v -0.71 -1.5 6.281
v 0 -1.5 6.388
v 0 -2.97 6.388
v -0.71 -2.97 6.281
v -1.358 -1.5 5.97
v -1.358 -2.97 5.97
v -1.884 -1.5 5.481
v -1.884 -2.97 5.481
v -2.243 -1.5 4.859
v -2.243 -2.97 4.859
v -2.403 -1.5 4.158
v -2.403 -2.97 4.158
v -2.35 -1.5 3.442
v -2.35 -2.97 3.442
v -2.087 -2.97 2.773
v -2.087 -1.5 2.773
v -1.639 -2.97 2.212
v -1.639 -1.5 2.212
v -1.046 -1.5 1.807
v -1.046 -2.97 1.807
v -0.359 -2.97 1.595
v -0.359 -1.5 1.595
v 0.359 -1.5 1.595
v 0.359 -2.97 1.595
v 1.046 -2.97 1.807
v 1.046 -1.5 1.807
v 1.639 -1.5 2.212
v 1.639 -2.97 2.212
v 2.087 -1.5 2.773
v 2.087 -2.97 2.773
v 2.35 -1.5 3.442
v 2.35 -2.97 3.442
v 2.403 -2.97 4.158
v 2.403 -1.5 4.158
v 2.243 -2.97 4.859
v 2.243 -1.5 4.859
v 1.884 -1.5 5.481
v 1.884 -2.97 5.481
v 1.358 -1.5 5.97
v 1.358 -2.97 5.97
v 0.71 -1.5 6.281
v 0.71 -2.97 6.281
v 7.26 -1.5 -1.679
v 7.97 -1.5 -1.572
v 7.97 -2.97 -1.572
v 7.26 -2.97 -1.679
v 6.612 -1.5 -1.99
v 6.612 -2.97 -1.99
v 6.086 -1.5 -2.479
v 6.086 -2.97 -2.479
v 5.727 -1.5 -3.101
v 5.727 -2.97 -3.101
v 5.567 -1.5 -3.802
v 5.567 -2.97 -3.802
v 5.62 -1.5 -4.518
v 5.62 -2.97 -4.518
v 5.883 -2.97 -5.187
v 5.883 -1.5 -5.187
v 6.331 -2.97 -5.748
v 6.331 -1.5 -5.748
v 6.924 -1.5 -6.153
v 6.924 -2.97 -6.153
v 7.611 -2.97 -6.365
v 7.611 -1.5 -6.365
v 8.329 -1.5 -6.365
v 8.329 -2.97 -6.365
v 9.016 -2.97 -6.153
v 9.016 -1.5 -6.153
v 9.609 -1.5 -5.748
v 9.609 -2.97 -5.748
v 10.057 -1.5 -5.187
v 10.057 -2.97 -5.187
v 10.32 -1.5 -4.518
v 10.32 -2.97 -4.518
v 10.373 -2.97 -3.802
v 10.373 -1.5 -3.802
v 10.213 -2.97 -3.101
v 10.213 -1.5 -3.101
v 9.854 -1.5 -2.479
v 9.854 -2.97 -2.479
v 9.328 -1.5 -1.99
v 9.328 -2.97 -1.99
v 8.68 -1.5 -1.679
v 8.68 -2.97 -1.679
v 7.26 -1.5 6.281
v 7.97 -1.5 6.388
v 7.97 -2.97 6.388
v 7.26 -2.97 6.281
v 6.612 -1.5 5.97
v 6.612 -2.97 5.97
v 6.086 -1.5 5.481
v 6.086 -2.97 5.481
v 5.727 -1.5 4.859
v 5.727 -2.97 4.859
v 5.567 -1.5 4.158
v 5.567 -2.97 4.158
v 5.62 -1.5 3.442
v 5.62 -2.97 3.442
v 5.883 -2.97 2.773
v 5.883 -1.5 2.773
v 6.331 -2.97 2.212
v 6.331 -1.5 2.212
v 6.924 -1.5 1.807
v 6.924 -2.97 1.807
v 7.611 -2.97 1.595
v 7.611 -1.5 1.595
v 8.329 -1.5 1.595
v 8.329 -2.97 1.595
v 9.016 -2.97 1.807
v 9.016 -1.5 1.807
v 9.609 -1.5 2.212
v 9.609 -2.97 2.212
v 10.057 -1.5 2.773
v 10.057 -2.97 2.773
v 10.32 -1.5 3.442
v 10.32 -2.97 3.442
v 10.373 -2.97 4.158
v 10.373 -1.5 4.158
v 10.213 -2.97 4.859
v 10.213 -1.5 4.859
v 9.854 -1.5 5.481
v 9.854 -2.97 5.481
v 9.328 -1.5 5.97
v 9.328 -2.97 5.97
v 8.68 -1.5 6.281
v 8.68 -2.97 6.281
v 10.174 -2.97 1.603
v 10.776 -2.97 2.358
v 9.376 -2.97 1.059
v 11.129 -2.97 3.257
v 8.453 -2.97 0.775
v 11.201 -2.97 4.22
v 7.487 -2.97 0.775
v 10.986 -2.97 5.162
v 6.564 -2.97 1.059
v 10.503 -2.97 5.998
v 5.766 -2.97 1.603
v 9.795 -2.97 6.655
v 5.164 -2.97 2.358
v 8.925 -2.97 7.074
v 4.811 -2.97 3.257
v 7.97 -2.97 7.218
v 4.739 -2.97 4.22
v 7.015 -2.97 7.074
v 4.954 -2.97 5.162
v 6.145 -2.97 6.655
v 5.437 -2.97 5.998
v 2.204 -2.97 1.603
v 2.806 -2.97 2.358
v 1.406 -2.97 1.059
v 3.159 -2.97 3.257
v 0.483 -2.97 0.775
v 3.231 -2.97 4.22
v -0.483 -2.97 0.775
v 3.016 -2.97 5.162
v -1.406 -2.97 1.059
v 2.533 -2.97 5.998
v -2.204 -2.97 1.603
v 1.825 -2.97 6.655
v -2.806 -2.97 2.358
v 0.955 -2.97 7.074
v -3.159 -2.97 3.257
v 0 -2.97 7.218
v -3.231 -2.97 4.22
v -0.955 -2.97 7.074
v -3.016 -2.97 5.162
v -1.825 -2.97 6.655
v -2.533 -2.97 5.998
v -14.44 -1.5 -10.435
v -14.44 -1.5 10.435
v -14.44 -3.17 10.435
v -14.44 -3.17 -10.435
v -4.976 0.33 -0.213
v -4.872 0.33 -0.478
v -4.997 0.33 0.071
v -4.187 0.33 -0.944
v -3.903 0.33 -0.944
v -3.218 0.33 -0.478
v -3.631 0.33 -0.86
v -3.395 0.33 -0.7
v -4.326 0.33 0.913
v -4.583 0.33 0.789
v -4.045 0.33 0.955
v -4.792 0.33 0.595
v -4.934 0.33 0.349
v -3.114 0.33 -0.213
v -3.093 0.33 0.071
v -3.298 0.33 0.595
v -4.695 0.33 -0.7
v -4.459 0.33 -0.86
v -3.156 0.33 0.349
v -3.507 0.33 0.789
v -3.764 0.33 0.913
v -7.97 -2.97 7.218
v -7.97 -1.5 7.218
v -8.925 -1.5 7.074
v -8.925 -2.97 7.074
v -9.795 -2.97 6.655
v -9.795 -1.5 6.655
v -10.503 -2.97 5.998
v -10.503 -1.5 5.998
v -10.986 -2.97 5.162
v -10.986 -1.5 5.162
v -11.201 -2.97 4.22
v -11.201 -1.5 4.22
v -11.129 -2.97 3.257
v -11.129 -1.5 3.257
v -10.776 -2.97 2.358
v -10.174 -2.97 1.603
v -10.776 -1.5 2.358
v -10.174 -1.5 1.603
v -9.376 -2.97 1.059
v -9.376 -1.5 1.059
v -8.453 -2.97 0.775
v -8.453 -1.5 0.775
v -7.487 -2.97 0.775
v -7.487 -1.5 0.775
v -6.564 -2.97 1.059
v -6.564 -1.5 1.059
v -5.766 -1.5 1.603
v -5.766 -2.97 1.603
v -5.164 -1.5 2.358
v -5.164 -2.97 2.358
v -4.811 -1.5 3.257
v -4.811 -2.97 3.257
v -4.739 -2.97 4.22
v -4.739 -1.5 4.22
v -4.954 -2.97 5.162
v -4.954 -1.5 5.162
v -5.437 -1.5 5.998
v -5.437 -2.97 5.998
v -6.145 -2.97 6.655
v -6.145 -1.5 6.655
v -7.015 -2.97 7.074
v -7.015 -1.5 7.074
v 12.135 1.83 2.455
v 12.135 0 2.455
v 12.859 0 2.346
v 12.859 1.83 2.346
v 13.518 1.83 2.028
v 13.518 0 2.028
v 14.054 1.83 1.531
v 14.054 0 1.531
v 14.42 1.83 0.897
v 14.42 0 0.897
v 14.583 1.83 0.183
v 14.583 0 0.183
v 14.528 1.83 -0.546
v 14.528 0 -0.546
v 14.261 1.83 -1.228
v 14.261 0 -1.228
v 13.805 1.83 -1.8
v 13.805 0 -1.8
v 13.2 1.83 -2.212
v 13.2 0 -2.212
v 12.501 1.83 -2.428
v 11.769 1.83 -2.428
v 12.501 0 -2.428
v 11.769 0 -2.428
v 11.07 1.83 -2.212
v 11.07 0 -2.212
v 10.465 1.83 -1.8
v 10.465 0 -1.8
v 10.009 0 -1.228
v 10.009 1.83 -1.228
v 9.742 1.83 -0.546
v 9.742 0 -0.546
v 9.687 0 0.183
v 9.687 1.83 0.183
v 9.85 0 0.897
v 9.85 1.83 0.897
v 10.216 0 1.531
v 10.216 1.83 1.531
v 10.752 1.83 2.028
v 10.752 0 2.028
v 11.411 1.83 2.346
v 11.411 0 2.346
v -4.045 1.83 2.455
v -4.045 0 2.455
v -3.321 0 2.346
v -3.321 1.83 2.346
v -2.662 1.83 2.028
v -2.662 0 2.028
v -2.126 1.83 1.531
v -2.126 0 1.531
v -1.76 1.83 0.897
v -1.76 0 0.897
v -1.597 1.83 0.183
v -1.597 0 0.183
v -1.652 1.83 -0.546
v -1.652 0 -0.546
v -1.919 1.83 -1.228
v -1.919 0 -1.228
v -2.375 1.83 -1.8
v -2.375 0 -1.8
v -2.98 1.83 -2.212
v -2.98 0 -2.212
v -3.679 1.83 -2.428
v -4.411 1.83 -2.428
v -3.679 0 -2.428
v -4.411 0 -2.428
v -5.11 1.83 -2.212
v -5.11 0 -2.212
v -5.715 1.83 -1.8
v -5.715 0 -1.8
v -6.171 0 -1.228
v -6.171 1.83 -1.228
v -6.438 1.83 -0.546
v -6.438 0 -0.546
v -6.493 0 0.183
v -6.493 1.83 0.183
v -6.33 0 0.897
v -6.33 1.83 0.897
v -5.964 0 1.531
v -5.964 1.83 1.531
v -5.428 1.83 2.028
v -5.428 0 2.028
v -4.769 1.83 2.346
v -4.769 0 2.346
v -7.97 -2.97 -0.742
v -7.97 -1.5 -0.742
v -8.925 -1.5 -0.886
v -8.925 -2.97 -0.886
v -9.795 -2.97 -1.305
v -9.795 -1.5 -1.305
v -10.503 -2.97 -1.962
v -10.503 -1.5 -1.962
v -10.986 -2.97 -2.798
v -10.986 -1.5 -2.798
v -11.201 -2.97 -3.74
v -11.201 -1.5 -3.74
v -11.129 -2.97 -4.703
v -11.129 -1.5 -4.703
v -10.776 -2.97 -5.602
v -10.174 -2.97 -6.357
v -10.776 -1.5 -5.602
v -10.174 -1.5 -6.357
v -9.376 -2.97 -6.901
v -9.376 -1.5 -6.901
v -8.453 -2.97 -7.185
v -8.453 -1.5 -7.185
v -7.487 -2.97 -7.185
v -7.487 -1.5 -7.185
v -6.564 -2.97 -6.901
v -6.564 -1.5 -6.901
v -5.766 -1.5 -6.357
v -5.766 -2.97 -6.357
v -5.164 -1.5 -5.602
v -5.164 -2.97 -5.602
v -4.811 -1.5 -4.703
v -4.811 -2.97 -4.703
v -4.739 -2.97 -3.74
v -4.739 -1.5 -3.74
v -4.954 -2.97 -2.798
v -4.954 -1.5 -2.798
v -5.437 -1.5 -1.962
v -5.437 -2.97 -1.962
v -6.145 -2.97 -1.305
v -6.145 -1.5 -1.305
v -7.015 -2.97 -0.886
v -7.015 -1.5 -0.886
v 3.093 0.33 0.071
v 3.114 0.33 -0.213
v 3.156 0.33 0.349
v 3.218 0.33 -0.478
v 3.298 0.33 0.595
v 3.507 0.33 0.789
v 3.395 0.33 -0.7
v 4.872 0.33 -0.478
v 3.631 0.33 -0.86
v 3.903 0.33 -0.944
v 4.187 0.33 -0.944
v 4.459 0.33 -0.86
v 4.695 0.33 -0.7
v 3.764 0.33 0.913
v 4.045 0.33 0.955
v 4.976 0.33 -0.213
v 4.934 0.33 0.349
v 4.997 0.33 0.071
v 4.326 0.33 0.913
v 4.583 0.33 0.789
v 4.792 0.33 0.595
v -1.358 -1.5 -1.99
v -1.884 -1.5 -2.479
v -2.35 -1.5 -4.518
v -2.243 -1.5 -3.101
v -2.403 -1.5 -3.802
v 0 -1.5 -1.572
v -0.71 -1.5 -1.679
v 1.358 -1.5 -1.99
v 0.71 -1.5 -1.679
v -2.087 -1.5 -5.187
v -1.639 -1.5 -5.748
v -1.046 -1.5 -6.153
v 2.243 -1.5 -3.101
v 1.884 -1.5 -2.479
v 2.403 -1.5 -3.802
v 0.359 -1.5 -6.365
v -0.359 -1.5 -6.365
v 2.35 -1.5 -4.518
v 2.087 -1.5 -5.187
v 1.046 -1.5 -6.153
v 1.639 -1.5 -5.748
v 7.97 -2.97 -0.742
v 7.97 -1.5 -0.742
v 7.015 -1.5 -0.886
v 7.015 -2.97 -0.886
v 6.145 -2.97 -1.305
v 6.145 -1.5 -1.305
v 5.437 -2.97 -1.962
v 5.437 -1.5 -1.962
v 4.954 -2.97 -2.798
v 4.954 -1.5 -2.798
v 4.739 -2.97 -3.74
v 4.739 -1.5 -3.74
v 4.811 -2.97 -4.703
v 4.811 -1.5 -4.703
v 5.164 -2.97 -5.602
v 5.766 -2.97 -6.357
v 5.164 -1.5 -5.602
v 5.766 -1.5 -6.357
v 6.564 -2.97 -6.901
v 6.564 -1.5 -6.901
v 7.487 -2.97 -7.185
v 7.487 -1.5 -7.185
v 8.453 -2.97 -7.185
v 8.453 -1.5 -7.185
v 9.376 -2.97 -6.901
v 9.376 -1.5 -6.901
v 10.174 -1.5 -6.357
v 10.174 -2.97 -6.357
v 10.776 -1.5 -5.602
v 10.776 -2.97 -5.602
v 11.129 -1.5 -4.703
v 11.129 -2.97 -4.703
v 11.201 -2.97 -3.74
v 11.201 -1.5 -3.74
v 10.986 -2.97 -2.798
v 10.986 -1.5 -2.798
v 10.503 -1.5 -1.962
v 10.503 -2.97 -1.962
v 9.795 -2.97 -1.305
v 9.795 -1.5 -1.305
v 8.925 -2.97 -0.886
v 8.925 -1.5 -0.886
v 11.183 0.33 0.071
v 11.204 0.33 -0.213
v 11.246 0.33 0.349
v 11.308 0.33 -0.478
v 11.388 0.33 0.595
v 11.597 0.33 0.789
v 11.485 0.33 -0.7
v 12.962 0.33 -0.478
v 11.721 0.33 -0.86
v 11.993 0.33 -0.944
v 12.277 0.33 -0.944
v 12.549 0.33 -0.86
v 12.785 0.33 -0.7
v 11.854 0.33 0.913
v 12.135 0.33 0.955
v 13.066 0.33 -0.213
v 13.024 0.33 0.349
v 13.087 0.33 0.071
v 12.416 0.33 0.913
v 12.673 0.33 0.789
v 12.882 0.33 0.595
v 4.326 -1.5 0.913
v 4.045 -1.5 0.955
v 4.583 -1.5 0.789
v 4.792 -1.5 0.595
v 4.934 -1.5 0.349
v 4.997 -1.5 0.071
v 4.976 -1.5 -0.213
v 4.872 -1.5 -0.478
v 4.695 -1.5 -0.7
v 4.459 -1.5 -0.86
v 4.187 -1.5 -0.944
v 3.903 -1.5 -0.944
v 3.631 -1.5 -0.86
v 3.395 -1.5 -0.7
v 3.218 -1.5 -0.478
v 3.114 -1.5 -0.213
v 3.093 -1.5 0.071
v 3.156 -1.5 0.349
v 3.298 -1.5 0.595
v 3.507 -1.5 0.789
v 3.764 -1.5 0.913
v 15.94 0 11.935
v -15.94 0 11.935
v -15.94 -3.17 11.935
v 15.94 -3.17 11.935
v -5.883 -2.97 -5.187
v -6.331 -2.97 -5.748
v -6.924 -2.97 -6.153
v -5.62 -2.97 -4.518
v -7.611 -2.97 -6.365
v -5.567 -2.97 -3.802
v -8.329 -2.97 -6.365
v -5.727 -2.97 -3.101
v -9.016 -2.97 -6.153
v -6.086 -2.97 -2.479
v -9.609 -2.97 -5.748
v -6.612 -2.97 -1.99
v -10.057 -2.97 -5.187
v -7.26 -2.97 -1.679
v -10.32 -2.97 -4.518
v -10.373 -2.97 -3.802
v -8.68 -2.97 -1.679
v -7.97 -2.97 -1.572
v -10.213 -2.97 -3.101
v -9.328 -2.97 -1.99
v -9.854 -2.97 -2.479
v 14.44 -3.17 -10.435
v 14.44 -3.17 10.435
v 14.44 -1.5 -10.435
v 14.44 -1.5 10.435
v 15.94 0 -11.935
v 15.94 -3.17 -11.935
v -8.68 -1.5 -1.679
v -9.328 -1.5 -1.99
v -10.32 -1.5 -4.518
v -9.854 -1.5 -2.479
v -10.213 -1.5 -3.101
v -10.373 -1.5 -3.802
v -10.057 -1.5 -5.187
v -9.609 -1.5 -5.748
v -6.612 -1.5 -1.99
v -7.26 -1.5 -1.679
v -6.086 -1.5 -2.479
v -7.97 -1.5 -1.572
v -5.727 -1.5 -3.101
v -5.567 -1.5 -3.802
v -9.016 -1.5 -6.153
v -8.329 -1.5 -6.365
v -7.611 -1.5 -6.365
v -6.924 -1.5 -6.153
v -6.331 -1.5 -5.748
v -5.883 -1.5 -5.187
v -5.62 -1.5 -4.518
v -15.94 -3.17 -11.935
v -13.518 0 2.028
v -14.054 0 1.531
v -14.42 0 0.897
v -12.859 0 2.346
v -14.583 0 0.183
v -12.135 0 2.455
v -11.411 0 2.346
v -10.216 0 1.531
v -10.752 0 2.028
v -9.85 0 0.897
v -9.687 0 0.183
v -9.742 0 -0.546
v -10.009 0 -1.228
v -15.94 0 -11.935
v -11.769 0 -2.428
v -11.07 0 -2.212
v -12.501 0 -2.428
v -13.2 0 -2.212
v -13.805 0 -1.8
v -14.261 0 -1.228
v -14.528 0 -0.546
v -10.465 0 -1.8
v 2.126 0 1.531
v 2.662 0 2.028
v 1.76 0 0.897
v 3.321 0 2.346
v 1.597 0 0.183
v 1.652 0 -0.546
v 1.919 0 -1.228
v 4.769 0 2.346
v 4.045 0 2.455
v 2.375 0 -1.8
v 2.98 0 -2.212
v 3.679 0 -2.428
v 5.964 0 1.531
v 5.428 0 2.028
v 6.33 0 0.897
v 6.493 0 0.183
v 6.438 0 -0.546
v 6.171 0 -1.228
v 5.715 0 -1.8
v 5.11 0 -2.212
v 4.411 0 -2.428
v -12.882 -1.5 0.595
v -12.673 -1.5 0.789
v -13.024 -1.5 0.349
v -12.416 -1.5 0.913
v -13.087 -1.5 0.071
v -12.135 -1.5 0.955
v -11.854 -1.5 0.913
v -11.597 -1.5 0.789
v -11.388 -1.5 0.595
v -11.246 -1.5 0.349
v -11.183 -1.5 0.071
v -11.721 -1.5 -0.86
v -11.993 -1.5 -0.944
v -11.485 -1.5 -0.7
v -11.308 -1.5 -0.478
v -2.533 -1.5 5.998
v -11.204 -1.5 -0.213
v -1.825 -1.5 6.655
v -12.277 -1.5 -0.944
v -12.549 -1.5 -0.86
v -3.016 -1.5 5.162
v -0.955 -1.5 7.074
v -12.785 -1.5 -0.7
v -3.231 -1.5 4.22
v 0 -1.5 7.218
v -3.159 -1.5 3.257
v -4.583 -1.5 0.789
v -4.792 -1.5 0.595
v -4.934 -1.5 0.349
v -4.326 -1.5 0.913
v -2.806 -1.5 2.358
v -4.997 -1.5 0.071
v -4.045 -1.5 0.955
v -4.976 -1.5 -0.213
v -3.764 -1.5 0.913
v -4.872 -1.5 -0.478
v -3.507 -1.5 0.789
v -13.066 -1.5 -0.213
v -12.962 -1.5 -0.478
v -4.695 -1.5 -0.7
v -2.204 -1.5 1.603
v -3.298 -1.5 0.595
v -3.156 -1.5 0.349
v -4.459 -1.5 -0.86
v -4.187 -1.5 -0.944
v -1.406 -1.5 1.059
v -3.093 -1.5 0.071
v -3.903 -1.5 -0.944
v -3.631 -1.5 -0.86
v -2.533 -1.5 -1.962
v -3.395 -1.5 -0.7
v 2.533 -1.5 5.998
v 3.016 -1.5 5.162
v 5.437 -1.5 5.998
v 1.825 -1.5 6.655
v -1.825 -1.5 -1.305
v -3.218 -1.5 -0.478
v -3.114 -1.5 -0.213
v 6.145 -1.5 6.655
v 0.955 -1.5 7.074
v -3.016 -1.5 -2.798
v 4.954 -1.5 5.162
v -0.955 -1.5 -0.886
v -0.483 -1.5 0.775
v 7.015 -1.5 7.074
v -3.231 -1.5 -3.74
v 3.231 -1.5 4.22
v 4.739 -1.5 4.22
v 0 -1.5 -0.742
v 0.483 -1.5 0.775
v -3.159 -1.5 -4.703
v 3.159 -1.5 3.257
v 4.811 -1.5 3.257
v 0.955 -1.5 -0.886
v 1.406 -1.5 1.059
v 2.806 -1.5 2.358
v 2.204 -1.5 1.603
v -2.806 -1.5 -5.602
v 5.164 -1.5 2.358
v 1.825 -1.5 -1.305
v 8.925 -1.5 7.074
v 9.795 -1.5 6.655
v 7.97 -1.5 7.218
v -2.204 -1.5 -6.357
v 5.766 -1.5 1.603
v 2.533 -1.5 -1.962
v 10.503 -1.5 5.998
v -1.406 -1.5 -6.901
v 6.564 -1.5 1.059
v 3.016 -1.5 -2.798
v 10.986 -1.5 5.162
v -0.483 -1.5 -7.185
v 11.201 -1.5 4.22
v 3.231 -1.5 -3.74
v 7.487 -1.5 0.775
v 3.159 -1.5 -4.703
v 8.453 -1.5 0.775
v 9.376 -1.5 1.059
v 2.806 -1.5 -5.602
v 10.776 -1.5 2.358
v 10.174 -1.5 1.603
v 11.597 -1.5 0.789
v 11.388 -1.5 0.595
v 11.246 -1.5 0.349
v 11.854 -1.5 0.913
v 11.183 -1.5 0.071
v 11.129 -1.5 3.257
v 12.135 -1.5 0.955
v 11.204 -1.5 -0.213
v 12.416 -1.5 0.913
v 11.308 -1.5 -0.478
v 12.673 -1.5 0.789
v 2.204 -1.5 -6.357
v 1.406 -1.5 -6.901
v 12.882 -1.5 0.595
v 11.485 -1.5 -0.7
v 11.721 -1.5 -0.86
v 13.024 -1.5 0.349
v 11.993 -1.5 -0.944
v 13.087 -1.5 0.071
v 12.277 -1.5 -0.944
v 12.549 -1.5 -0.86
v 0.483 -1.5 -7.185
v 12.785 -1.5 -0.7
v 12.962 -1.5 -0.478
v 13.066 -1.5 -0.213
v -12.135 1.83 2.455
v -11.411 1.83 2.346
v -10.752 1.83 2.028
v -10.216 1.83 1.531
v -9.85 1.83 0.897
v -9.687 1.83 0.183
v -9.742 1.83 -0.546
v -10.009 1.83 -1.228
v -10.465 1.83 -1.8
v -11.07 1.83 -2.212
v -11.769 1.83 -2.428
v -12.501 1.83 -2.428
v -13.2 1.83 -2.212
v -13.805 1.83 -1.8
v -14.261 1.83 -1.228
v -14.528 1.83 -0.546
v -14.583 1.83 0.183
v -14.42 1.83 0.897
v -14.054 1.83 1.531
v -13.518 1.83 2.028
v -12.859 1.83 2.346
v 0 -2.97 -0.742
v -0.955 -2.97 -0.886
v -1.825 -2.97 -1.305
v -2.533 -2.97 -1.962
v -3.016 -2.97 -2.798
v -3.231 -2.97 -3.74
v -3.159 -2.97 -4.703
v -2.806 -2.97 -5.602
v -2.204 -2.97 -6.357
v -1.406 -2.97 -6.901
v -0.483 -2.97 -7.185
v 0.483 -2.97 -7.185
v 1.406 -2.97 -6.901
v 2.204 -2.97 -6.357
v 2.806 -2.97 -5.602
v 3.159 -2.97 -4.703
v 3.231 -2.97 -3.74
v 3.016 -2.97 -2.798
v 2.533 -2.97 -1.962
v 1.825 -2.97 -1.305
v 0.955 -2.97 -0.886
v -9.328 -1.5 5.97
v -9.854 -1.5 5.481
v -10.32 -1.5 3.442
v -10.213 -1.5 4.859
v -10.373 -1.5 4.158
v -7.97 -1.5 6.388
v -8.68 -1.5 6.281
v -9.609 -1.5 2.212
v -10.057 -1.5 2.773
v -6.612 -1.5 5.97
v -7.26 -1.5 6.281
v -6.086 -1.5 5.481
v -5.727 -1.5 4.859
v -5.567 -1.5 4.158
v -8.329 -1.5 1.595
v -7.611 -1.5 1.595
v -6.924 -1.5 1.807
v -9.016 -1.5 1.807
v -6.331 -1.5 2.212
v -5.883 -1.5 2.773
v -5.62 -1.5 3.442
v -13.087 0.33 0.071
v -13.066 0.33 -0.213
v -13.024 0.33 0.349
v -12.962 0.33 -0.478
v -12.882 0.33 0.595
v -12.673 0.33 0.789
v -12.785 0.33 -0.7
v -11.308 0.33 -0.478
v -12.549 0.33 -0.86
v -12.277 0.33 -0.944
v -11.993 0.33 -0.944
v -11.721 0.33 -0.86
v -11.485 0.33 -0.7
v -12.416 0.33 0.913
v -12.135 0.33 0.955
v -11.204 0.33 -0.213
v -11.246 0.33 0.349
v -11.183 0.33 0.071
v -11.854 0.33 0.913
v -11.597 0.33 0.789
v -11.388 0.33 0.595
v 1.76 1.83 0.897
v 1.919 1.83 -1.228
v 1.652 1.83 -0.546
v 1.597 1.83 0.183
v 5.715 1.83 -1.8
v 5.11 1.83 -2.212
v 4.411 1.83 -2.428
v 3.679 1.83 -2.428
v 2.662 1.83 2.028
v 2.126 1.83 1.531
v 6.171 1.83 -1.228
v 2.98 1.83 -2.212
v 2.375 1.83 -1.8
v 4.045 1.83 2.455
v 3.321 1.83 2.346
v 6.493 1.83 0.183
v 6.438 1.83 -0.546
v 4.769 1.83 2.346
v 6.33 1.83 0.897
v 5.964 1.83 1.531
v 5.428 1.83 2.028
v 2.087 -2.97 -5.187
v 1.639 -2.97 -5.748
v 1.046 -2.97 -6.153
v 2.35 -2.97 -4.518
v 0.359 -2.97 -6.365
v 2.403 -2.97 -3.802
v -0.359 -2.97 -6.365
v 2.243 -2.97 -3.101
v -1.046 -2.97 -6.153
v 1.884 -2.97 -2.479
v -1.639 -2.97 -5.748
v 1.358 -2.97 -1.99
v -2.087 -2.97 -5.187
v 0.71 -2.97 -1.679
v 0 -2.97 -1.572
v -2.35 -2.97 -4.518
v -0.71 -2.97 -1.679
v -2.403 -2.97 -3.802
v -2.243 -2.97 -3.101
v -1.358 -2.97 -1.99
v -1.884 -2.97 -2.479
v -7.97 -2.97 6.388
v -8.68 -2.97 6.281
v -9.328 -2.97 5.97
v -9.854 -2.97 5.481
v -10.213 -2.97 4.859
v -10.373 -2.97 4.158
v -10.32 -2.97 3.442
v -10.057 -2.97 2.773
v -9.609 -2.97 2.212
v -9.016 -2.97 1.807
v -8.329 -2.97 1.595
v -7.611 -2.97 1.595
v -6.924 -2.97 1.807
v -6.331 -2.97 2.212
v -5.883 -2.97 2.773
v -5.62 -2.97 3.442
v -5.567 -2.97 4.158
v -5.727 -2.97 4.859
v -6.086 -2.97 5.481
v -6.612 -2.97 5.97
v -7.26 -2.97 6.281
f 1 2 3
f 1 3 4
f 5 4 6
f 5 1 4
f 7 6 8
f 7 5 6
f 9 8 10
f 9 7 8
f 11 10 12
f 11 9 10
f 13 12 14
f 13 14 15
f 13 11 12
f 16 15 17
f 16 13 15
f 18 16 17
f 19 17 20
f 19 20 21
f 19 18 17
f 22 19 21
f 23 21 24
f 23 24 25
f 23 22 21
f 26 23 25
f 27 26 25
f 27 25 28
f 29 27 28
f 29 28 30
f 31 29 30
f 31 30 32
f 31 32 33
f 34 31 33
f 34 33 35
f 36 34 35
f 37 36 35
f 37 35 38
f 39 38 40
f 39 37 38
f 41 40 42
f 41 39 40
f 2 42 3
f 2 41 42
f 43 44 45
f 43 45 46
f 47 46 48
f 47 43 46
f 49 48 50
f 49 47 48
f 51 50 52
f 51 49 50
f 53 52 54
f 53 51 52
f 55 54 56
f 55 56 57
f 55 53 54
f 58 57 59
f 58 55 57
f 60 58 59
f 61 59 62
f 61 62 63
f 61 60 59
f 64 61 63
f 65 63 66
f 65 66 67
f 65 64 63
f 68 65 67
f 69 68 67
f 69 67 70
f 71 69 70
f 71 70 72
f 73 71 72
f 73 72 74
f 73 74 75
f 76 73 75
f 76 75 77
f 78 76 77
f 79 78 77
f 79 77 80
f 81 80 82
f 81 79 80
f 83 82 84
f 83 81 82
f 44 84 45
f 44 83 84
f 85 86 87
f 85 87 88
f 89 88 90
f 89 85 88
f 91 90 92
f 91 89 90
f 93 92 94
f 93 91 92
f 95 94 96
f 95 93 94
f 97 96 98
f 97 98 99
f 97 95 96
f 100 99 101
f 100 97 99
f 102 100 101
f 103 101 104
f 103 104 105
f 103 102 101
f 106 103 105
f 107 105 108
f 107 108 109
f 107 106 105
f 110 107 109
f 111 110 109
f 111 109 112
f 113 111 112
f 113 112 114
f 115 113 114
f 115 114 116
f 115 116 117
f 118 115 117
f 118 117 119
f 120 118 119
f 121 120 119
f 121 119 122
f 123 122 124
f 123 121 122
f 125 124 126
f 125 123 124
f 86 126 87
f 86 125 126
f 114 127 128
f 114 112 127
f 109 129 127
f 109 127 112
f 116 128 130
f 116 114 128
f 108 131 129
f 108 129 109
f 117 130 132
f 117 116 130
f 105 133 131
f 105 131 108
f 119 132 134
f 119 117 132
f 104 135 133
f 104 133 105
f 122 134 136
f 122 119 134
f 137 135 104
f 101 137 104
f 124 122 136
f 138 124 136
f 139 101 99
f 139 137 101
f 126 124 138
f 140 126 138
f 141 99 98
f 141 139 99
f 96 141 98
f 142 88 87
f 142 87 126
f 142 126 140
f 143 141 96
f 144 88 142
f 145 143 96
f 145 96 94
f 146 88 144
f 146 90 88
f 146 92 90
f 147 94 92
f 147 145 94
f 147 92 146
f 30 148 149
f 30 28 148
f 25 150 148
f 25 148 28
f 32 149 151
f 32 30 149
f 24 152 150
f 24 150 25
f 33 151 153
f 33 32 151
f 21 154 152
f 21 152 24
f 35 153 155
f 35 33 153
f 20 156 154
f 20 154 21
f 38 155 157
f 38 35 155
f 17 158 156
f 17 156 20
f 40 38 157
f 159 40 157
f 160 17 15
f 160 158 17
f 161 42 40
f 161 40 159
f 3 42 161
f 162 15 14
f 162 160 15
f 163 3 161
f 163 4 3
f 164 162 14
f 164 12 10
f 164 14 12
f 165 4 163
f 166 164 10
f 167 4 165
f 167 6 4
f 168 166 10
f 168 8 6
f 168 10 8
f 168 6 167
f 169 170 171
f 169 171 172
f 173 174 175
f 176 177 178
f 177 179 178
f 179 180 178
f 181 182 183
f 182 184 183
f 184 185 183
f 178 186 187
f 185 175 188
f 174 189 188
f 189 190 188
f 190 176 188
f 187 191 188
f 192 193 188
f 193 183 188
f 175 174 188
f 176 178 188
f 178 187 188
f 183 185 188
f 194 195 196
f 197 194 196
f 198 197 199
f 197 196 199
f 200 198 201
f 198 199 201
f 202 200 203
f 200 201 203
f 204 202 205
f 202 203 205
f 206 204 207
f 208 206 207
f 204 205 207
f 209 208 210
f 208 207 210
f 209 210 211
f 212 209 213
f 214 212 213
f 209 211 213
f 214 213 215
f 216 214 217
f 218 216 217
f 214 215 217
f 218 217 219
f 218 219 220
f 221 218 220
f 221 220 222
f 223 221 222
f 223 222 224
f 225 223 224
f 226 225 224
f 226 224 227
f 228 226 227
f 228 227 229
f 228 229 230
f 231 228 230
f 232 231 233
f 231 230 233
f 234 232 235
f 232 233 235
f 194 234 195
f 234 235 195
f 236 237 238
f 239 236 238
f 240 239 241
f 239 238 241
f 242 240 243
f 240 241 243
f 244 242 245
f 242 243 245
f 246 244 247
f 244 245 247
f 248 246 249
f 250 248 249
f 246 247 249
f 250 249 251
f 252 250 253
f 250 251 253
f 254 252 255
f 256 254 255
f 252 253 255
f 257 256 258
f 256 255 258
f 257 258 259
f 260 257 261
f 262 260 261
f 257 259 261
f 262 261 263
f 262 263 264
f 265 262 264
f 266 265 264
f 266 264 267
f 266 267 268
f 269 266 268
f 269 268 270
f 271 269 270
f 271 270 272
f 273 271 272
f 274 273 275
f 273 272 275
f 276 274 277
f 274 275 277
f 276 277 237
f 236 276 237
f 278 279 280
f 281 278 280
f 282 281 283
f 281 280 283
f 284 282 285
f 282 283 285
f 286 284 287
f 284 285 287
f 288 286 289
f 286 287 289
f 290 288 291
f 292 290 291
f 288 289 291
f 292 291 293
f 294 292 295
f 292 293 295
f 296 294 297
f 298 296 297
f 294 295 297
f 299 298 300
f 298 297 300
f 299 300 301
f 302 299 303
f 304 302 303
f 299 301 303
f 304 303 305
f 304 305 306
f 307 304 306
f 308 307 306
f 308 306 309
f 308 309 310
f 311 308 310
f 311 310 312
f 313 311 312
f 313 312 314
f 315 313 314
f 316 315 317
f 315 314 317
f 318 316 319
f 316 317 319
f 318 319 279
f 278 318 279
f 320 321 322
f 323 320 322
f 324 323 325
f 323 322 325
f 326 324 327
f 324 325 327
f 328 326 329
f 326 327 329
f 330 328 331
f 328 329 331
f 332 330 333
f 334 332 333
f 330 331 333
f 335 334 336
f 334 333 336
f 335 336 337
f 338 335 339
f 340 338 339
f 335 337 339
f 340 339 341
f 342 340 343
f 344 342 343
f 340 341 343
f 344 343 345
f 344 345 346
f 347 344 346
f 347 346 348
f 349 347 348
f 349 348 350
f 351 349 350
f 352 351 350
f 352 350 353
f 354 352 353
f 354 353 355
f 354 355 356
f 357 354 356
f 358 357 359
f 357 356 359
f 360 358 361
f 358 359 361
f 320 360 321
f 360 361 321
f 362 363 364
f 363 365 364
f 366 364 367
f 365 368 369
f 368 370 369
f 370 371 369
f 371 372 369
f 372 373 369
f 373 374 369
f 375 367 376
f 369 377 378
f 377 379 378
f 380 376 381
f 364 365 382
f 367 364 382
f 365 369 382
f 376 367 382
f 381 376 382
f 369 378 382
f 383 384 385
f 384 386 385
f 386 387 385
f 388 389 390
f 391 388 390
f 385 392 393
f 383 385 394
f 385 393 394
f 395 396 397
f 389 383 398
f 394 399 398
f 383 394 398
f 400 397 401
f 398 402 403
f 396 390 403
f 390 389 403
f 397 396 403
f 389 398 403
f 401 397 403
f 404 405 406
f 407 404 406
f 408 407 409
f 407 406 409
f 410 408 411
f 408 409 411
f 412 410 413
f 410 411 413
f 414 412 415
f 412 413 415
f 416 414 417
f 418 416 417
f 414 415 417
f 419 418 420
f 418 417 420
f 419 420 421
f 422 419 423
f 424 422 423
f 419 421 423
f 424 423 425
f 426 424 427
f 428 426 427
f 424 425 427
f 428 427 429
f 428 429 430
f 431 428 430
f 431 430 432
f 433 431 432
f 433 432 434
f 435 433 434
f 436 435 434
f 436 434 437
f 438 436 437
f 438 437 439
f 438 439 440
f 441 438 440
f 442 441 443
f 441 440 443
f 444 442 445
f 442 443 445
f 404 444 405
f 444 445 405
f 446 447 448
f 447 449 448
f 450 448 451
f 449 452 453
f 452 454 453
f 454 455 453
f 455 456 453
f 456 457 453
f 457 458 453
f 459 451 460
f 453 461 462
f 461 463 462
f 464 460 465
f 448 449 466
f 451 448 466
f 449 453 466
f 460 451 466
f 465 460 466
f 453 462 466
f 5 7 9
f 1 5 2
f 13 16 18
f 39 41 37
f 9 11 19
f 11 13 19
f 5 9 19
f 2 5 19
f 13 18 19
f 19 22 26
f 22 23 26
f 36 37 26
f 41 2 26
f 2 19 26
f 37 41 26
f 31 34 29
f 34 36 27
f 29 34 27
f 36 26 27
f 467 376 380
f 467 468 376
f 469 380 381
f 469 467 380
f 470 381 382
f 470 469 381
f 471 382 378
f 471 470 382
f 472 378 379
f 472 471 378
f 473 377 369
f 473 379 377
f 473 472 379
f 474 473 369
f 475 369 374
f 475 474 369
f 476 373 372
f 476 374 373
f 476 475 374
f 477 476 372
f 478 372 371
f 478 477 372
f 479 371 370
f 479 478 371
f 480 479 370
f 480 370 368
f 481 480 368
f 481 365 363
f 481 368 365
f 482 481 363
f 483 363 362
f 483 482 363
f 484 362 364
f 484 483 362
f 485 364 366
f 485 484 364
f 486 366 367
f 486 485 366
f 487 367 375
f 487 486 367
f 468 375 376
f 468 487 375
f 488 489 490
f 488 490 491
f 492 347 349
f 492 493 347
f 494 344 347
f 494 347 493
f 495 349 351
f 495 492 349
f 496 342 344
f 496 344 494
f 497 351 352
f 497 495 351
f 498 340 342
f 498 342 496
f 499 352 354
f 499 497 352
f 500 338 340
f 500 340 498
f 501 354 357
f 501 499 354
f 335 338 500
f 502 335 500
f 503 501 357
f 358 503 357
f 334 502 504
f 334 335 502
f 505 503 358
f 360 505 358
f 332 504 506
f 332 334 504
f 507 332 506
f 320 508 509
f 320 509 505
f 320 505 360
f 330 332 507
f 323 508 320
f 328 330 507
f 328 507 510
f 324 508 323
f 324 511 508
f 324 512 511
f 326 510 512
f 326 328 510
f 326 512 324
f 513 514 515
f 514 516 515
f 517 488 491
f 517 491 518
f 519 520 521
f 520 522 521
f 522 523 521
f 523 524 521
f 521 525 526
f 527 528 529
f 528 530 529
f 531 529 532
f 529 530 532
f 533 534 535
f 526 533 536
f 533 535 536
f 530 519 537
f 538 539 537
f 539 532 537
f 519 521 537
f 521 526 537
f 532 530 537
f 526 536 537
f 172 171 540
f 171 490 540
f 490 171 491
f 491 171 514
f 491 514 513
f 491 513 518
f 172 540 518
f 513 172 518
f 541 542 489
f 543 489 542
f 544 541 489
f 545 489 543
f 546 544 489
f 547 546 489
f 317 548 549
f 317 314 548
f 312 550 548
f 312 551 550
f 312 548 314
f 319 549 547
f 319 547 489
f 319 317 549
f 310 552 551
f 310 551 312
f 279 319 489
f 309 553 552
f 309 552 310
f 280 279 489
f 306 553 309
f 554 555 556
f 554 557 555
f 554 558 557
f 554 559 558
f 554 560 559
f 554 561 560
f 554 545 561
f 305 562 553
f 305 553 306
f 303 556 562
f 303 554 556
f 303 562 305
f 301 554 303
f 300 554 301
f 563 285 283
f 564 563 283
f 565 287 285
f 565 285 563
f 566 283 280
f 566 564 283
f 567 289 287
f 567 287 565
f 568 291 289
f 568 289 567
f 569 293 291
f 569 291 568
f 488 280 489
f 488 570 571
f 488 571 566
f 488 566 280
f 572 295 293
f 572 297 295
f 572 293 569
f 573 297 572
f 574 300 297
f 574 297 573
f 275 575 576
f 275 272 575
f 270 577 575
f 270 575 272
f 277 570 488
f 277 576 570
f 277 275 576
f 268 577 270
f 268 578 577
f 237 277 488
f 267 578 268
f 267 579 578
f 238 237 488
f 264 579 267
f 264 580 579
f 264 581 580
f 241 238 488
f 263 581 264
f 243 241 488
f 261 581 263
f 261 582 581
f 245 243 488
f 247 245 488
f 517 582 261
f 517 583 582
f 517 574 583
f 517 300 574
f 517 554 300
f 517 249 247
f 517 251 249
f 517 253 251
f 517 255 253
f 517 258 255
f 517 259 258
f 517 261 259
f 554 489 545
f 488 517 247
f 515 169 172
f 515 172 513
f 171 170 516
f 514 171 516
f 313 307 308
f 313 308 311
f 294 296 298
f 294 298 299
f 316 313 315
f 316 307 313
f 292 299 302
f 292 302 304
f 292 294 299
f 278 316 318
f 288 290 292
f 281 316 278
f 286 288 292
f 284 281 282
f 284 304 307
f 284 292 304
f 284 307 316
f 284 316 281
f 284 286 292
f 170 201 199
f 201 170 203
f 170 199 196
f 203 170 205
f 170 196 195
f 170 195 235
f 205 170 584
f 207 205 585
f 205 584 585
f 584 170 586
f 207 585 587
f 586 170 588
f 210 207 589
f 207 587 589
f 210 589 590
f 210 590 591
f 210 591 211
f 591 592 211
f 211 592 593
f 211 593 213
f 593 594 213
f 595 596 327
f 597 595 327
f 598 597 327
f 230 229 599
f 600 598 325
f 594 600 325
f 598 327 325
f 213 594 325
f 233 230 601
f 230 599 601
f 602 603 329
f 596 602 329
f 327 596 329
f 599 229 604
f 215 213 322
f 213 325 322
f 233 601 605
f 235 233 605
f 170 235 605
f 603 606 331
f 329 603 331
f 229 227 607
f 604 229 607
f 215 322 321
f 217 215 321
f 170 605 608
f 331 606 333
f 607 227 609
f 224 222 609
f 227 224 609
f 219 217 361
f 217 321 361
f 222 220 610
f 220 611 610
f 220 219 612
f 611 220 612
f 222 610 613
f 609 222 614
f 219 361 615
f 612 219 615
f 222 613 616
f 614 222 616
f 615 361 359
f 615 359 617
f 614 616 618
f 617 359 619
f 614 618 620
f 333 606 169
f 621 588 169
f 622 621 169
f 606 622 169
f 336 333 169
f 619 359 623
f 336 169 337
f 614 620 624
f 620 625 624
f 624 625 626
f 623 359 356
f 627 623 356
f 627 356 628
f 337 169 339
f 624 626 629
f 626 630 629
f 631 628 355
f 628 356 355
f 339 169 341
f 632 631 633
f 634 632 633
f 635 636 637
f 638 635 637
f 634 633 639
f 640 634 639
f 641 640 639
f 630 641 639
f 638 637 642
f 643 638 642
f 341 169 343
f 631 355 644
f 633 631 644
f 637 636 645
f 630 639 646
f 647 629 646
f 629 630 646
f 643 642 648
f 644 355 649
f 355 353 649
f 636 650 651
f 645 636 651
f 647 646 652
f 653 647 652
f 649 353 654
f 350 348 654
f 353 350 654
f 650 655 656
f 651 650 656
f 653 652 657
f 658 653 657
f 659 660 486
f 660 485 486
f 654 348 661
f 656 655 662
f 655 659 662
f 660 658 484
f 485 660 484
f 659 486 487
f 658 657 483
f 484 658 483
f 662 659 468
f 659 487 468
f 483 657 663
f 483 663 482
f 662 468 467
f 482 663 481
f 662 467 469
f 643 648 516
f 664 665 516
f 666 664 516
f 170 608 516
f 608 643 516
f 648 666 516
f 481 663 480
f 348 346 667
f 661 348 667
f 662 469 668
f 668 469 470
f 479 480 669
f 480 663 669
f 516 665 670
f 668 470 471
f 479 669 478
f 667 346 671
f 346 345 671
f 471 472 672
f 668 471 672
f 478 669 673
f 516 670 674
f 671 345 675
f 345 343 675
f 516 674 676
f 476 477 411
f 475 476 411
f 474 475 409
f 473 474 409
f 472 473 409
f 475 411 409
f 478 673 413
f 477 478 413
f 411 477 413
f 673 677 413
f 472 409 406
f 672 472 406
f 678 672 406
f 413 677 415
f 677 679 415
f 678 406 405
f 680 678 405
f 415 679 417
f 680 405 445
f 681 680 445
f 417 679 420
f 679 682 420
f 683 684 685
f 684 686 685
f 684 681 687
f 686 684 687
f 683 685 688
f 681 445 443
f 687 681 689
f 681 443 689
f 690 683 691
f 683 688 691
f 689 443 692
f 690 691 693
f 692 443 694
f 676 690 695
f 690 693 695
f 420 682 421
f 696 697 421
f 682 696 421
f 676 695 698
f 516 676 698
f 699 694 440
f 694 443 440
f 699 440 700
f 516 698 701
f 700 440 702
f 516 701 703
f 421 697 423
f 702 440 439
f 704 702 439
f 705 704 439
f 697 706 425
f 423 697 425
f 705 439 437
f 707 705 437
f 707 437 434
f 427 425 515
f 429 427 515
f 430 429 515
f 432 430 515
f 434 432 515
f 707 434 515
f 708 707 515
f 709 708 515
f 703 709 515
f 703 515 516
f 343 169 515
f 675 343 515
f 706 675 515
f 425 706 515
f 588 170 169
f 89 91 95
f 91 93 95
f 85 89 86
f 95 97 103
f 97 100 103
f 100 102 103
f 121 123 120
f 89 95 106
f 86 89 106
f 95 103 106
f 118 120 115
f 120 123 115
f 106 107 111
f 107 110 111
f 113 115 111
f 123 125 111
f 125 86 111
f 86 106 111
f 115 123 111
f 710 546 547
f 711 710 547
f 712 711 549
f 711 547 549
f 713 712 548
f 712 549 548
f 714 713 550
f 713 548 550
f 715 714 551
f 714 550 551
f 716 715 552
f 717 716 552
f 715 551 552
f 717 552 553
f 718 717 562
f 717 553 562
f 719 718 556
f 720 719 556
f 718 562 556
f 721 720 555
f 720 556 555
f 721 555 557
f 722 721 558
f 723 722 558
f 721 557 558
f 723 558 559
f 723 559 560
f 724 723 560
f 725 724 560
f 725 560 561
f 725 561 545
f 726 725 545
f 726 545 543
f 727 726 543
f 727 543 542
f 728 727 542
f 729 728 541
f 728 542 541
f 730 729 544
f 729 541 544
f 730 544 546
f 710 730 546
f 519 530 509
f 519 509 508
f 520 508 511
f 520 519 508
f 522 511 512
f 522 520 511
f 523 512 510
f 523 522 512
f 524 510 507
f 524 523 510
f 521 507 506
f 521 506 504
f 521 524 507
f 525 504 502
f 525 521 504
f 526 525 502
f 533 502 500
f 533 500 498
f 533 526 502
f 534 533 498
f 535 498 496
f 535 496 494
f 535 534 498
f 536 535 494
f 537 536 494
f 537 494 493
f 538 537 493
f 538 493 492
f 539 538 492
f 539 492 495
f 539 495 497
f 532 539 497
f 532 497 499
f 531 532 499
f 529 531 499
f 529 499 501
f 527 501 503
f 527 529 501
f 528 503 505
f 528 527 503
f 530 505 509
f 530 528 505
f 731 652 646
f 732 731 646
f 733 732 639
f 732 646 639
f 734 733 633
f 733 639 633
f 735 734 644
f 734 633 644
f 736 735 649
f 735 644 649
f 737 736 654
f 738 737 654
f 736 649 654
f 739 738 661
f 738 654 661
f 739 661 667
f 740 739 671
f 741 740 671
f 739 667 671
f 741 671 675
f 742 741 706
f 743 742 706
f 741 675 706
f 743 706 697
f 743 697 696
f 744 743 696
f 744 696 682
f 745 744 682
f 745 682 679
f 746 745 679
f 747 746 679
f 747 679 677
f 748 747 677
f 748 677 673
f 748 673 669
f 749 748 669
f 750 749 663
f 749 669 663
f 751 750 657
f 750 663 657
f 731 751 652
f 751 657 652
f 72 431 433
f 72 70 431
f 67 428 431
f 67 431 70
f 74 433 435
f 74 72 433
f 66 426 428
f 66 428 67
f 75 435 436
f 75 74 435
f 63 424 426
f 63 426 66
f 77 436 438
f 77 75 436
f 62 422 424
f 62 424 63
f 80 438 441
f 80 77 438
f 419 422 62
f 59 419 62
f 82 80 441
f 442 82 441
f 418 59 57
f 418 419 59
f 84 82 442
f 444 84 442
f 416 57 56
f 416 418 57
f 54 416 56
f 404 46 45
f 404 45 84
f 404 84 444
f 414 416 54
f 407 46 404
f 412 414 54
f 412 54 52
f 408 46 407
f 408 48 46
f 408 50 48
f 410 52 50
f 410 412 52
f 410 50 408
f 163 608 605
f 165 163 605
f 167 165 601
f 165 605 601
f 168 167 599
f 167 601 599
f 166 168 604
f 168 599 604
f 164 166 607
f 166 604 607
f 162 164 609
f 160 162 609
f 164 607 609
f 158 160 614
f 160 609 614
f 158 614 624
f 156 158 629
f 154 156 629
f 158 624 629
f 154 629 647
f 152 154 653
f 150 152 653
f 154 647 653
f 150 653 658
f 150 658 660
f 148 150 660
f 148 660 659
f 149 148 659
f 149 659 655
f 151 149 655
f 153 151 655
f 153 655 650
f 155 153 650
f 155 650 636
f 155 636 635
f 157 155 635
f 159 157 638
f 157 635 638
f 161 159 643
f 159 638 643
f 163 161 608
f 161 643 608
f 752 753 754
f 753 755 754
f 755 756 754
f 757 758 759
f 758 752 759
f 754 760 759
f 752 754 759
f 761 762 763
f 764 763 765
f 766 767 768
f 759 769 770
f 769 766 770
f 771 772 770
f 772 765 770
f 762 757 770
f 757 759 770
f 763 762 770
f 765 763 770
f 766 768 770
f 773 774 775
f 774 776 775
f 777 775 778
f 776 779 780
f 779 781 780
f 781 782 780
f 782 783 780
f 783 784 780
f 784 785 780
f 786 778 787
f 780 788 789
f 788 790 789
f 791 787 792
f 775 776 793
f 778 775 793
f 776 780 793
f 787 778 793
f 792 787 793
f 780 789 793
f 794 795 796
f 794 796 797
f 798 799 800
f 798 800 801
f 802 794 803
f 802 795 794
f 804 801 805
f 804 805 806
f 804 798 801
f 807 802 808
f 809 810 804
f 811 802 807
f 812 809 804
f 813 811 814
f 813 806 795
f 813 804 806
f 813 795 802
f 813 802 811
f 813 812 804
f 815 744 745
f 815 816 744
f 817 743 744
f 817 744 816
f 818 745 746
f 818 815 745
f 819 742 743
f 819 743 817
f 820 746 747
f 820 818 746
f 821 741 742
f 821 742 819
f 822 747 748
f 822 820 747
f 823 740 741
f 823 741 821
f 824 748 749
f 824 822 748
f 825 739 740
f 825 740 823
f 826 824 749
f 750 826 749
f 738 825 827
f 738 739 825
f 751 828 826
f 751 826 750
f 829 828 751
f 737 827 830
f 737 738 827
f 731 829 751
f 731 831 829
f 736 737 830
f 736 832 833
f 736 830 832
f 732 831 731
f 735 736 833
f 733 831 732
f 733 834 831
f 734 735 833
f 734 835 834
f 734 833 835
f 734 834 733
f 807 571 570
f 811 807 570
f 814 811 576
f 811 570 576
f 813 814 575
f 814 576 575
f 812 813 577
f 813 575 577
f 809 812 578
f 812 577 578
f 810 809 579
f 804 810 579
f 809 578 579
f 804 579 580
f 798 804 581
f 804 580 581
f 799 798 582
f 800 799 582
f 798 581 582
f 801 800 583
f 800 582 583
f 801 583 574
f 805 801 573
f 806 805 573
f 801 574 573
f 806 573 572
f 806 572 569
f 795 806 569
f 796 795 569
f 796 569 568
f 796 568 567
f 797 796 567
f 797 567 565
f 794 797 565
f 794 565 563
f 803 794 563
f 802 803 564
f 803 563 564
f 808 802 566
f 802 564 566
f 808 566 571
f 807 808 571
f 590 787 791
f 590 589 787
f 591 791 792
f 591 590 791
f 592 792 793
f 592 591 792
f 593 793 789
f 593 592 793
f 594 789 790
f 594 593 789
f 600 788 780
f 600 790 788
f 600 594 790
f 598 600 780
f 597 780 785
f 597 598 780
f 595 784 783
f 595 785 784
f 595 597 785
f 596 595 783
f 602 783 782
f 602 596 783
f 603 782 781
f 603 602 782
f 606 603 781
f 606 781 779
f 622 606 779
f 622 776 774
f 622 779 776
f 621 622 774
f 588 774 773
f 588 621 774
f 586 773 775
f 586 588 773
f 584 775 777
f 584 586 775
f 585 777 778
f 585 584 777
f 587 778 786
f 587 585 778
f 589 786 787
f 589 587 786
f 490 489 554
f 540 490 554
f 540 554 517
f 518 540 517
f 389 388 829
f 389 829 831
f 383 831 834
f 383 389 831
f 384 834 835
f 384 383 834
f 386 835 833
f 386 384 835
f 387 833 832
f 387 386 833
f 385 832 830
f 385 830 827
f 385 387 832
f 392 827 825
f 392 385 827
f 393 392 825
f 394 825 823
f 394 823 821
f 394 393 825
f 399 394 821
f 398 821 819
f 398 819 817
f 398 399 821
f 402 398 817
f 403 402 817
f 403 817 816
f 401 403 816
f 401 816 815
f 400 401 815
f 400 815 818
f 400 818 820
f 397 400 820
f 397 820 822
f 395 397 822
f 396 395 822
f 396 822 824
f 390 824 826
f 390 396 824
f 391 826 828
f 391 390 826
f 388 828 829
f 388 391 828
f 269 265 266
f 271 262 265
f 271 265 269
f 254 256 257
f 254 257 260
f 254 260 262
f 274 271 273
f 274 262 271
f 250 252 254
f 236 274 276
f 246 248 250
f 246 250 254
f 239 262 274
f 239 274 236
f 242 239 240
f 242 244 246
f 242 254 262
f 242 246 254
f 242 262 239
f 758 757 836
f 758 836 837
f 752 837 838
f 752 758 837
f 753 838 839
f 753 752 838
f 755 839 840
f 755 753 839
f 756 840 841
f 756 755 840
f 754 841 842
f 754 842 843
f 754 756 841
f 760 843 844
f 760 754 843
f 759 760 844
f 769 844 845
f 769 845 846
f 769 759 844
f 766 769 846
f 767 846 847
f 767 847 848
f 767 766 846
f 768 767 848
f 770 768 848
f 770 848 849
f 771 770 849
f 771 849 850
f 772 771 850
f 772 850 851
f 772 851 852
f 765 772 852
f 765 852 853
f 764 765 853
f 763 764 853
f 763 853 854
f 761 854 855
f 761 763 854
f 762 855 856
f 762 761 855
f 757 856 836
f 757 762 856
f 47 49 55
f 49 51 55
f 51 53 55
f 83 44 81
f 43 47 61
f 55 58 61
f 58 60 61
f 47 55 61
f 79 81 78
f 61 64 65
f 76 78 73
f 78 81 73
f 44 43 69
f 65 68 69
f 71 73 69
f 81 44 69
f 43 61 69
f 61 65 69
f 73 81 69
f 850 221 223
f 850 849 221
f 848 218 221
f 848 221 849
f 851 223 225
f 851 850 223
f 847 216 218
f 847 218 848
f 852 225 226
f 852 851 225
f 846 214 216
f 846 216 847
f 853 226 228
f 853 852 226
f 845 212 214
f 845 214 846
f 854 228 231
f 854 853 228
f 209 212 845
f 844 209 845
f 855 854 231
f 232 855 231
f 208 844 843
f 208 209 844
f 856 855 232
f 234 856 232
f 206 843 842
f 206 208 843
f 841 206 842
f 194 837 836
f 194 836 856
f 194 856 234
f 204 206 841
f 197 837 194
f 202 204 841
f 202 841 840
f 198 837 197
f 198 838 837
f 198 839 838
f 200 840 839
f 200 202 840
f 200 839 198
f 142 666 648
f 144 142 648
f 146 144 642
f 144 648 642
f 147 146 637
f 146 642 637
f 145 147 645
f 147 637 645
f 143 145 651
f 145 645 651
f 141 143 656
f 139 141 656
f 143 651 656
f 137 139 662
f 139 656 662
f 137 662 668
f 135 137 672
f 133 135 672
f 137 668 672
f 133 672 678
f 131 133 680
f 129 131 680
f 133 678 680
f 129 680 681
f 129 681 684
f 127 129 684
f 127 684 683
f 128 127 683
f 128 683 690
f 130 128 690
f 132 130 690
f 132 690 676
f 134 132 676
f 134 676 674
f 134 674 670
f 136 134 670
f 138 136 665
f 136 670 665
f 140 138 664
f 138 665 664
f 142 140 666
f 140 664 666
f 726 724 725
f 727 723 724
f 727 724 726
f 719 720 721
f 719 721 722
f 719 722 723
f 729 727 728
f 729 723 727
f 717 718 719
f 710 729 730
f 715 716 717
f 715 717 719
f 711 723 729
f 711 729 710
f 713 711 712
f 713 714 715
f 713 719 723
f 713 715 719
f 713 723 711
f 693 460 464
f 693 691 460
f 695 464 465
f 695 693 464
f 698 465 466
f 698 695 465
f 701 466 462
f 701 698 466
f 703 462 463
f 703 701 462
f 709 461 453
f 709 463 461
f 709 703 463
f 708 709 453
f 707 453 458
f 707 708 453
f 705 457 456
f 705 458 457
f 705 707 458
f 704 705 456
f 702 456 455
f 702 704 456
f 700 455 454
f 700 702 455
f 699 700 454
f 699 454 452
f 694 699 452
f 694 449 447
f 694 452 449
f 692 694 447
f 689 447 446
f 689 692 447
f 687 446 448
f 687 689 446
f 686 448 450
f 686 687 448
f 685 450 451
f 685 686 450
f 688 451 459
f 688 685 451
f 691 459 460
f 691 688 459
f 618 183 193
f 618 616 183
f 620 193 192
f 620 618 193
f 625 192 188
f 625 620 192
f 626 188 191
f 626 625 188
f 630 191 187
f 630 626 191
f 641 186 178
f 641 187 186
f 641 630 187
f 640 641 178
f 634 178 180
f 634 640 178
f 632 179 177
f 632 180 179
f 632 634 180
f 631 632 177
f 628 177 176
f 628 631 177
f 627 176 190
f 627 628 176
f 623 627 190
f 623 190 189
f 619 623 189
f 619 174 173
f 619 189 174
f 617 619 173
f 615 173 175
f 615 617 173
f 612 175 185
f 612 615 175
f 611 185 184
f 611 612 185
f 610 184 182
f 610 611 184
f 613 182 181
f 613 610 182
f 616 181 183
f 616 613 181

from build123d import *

# Parameters (mm, degrees)
SKETCH2_W           = 31.88
SKETCH2_H           = 23.87
BOSS_EXTRUDE1_DEPTH = 3.17
SKETCH3_R           = 2.455
BOSS_EXTRUDE2_DEPTH = 1.83
SHELL1_T            = -1.5
SKETCH4_R           = 3.24
SKETCH4_R_2         = 2.41
BOSS_EXTRUDE3_DEPTH = 1.47


with BuildPart() as part:
    # Sketch2 → Boss-Extrude1 (new body)
    with BuildSketch(Plane(origin=(0, 0, 0), x_dir=(1, 0, 0), z_dir=(0, 1, 0))):
        Rectangle(SKETCH2_W, SKETCH2_H)
    extrude(amount=-BOSS_EXTRUDE1_DEPTH)

    # Sketch3 → Boss-Extrude2 (add)
    with BuildSketch(Plane(origin=(0, 0, 0), x_dir=(1, 0, 0), z_dir=(0, 1, 0))):
        with Locations(Location((-12.135, 0, 0), (0, 0, 270))):
            Circle(SKETCH3_R)
        with Locations(Location((-4.045, 0, 0), (0, 0, 270))):
            Circle(SKETCH3_R)
        with Locations(Location((4.045, 0, 0), (0, 0, 270))):
            Circle(SKETCH3_R)
        with Locations(Location((12.135, 0, 0), (0, 0, 270))):
            Circle(SKETCH3_R)
    extrude(amount=BOSS_EXTRUDE2_DEPTH)

    # Shell1
    shell1_openings = [part.faces().sort_by_distance(p)[0] for p in [
        (0, -3.17, 0),
    ]]
    offset(amount=SHELL1_T, openings=shell1_openings, kind=Kind.INTERSECTION)

    # Sketch4 → Boss-Extrude3 (add)
    # profile 1 of 6: a face of its own
    with BuildSketch(Plane.XZ.offset(1.5)):
        with Locations(Location((-7.97, 3.978333333, 0), (0, 0, 90))):
            Circle(SKETCH4_R)
        with Locations(Location((-7.97, 3.978333333, 0), (0, 0, 90))):
            Circle(SKETCH4_R_2, mode=Mode.SUBTRACT)
    # profile 2 of 6: a face of its own
    with BuildSketch(Plane.XZ.offset(1.5)):
        with Locations(Location((0, 3.978333333, 0), (0, 0, 90))):
            Circle(SKETCH4_R)
        with Locations(Location((0, 3.978333333, 0), (0, 0, 90))):
            Circle(SKETCH4_R_2, mode=Mode.SUBTRACT)
    # profile 3 of 6: a face of its own
    with BuildSketch(Plane.XZ.offset(1.5)):
        with Locations(Location((7.97, 3.978333333, 0), (0, 0, 90))):
            Circle(SKETCH4_R)
        with Locations(Location((7.97, 3.978333333, 0), (0, 0, 90))):
            Circle(SKETCH4_R_2, mode=Mode.SUBTRACT)
    # profile 4 of 6: a face of its own
    with BuildSketch(Plane.XZ.offset(1.5)):
        with Locations(Location((0, -3.981666667, 0), (0, 0, 90))):
            Circle(SKETCH4_R)
        with Locations(Location((0, -3.981666667, 0), (0, 0, 90))):
            Circle(SKETCH4_R_2, mode=Mode.SUBTRACT)
    # profile 5 of 6: a face of its own
    with BuildSketch(Plane.XZ.offset(1.5)):
        with Locations(Location((7.97, -3.981666667, 0), (0, 0, 90))):
            Circle(SKETCH4_R)
        with Locations(Location((7.97, -3.981666667, 0), (0, 0, 90))):
            Circle(SKETCH4_R_2, mode=Mode.SUBTRACT)
    # profile 6 of 6: a face of its own
    with BuildSketch(Plane.XZ.offset(1.5)):
        with Locations(Location((-7.97, -3.981666667, 0), (0, 0, 90))):
            Circle(SKETCH4_R)
        with Locations(Location((-7.97, -3.981666667, 0), (0, 0, 90))):
            Circle(SKETCH4_R_2, mode=Mode.SUBTRACT)
    extrude(amount=BOSS_EXTRUDE3_DEPTH)


solid = part.part
